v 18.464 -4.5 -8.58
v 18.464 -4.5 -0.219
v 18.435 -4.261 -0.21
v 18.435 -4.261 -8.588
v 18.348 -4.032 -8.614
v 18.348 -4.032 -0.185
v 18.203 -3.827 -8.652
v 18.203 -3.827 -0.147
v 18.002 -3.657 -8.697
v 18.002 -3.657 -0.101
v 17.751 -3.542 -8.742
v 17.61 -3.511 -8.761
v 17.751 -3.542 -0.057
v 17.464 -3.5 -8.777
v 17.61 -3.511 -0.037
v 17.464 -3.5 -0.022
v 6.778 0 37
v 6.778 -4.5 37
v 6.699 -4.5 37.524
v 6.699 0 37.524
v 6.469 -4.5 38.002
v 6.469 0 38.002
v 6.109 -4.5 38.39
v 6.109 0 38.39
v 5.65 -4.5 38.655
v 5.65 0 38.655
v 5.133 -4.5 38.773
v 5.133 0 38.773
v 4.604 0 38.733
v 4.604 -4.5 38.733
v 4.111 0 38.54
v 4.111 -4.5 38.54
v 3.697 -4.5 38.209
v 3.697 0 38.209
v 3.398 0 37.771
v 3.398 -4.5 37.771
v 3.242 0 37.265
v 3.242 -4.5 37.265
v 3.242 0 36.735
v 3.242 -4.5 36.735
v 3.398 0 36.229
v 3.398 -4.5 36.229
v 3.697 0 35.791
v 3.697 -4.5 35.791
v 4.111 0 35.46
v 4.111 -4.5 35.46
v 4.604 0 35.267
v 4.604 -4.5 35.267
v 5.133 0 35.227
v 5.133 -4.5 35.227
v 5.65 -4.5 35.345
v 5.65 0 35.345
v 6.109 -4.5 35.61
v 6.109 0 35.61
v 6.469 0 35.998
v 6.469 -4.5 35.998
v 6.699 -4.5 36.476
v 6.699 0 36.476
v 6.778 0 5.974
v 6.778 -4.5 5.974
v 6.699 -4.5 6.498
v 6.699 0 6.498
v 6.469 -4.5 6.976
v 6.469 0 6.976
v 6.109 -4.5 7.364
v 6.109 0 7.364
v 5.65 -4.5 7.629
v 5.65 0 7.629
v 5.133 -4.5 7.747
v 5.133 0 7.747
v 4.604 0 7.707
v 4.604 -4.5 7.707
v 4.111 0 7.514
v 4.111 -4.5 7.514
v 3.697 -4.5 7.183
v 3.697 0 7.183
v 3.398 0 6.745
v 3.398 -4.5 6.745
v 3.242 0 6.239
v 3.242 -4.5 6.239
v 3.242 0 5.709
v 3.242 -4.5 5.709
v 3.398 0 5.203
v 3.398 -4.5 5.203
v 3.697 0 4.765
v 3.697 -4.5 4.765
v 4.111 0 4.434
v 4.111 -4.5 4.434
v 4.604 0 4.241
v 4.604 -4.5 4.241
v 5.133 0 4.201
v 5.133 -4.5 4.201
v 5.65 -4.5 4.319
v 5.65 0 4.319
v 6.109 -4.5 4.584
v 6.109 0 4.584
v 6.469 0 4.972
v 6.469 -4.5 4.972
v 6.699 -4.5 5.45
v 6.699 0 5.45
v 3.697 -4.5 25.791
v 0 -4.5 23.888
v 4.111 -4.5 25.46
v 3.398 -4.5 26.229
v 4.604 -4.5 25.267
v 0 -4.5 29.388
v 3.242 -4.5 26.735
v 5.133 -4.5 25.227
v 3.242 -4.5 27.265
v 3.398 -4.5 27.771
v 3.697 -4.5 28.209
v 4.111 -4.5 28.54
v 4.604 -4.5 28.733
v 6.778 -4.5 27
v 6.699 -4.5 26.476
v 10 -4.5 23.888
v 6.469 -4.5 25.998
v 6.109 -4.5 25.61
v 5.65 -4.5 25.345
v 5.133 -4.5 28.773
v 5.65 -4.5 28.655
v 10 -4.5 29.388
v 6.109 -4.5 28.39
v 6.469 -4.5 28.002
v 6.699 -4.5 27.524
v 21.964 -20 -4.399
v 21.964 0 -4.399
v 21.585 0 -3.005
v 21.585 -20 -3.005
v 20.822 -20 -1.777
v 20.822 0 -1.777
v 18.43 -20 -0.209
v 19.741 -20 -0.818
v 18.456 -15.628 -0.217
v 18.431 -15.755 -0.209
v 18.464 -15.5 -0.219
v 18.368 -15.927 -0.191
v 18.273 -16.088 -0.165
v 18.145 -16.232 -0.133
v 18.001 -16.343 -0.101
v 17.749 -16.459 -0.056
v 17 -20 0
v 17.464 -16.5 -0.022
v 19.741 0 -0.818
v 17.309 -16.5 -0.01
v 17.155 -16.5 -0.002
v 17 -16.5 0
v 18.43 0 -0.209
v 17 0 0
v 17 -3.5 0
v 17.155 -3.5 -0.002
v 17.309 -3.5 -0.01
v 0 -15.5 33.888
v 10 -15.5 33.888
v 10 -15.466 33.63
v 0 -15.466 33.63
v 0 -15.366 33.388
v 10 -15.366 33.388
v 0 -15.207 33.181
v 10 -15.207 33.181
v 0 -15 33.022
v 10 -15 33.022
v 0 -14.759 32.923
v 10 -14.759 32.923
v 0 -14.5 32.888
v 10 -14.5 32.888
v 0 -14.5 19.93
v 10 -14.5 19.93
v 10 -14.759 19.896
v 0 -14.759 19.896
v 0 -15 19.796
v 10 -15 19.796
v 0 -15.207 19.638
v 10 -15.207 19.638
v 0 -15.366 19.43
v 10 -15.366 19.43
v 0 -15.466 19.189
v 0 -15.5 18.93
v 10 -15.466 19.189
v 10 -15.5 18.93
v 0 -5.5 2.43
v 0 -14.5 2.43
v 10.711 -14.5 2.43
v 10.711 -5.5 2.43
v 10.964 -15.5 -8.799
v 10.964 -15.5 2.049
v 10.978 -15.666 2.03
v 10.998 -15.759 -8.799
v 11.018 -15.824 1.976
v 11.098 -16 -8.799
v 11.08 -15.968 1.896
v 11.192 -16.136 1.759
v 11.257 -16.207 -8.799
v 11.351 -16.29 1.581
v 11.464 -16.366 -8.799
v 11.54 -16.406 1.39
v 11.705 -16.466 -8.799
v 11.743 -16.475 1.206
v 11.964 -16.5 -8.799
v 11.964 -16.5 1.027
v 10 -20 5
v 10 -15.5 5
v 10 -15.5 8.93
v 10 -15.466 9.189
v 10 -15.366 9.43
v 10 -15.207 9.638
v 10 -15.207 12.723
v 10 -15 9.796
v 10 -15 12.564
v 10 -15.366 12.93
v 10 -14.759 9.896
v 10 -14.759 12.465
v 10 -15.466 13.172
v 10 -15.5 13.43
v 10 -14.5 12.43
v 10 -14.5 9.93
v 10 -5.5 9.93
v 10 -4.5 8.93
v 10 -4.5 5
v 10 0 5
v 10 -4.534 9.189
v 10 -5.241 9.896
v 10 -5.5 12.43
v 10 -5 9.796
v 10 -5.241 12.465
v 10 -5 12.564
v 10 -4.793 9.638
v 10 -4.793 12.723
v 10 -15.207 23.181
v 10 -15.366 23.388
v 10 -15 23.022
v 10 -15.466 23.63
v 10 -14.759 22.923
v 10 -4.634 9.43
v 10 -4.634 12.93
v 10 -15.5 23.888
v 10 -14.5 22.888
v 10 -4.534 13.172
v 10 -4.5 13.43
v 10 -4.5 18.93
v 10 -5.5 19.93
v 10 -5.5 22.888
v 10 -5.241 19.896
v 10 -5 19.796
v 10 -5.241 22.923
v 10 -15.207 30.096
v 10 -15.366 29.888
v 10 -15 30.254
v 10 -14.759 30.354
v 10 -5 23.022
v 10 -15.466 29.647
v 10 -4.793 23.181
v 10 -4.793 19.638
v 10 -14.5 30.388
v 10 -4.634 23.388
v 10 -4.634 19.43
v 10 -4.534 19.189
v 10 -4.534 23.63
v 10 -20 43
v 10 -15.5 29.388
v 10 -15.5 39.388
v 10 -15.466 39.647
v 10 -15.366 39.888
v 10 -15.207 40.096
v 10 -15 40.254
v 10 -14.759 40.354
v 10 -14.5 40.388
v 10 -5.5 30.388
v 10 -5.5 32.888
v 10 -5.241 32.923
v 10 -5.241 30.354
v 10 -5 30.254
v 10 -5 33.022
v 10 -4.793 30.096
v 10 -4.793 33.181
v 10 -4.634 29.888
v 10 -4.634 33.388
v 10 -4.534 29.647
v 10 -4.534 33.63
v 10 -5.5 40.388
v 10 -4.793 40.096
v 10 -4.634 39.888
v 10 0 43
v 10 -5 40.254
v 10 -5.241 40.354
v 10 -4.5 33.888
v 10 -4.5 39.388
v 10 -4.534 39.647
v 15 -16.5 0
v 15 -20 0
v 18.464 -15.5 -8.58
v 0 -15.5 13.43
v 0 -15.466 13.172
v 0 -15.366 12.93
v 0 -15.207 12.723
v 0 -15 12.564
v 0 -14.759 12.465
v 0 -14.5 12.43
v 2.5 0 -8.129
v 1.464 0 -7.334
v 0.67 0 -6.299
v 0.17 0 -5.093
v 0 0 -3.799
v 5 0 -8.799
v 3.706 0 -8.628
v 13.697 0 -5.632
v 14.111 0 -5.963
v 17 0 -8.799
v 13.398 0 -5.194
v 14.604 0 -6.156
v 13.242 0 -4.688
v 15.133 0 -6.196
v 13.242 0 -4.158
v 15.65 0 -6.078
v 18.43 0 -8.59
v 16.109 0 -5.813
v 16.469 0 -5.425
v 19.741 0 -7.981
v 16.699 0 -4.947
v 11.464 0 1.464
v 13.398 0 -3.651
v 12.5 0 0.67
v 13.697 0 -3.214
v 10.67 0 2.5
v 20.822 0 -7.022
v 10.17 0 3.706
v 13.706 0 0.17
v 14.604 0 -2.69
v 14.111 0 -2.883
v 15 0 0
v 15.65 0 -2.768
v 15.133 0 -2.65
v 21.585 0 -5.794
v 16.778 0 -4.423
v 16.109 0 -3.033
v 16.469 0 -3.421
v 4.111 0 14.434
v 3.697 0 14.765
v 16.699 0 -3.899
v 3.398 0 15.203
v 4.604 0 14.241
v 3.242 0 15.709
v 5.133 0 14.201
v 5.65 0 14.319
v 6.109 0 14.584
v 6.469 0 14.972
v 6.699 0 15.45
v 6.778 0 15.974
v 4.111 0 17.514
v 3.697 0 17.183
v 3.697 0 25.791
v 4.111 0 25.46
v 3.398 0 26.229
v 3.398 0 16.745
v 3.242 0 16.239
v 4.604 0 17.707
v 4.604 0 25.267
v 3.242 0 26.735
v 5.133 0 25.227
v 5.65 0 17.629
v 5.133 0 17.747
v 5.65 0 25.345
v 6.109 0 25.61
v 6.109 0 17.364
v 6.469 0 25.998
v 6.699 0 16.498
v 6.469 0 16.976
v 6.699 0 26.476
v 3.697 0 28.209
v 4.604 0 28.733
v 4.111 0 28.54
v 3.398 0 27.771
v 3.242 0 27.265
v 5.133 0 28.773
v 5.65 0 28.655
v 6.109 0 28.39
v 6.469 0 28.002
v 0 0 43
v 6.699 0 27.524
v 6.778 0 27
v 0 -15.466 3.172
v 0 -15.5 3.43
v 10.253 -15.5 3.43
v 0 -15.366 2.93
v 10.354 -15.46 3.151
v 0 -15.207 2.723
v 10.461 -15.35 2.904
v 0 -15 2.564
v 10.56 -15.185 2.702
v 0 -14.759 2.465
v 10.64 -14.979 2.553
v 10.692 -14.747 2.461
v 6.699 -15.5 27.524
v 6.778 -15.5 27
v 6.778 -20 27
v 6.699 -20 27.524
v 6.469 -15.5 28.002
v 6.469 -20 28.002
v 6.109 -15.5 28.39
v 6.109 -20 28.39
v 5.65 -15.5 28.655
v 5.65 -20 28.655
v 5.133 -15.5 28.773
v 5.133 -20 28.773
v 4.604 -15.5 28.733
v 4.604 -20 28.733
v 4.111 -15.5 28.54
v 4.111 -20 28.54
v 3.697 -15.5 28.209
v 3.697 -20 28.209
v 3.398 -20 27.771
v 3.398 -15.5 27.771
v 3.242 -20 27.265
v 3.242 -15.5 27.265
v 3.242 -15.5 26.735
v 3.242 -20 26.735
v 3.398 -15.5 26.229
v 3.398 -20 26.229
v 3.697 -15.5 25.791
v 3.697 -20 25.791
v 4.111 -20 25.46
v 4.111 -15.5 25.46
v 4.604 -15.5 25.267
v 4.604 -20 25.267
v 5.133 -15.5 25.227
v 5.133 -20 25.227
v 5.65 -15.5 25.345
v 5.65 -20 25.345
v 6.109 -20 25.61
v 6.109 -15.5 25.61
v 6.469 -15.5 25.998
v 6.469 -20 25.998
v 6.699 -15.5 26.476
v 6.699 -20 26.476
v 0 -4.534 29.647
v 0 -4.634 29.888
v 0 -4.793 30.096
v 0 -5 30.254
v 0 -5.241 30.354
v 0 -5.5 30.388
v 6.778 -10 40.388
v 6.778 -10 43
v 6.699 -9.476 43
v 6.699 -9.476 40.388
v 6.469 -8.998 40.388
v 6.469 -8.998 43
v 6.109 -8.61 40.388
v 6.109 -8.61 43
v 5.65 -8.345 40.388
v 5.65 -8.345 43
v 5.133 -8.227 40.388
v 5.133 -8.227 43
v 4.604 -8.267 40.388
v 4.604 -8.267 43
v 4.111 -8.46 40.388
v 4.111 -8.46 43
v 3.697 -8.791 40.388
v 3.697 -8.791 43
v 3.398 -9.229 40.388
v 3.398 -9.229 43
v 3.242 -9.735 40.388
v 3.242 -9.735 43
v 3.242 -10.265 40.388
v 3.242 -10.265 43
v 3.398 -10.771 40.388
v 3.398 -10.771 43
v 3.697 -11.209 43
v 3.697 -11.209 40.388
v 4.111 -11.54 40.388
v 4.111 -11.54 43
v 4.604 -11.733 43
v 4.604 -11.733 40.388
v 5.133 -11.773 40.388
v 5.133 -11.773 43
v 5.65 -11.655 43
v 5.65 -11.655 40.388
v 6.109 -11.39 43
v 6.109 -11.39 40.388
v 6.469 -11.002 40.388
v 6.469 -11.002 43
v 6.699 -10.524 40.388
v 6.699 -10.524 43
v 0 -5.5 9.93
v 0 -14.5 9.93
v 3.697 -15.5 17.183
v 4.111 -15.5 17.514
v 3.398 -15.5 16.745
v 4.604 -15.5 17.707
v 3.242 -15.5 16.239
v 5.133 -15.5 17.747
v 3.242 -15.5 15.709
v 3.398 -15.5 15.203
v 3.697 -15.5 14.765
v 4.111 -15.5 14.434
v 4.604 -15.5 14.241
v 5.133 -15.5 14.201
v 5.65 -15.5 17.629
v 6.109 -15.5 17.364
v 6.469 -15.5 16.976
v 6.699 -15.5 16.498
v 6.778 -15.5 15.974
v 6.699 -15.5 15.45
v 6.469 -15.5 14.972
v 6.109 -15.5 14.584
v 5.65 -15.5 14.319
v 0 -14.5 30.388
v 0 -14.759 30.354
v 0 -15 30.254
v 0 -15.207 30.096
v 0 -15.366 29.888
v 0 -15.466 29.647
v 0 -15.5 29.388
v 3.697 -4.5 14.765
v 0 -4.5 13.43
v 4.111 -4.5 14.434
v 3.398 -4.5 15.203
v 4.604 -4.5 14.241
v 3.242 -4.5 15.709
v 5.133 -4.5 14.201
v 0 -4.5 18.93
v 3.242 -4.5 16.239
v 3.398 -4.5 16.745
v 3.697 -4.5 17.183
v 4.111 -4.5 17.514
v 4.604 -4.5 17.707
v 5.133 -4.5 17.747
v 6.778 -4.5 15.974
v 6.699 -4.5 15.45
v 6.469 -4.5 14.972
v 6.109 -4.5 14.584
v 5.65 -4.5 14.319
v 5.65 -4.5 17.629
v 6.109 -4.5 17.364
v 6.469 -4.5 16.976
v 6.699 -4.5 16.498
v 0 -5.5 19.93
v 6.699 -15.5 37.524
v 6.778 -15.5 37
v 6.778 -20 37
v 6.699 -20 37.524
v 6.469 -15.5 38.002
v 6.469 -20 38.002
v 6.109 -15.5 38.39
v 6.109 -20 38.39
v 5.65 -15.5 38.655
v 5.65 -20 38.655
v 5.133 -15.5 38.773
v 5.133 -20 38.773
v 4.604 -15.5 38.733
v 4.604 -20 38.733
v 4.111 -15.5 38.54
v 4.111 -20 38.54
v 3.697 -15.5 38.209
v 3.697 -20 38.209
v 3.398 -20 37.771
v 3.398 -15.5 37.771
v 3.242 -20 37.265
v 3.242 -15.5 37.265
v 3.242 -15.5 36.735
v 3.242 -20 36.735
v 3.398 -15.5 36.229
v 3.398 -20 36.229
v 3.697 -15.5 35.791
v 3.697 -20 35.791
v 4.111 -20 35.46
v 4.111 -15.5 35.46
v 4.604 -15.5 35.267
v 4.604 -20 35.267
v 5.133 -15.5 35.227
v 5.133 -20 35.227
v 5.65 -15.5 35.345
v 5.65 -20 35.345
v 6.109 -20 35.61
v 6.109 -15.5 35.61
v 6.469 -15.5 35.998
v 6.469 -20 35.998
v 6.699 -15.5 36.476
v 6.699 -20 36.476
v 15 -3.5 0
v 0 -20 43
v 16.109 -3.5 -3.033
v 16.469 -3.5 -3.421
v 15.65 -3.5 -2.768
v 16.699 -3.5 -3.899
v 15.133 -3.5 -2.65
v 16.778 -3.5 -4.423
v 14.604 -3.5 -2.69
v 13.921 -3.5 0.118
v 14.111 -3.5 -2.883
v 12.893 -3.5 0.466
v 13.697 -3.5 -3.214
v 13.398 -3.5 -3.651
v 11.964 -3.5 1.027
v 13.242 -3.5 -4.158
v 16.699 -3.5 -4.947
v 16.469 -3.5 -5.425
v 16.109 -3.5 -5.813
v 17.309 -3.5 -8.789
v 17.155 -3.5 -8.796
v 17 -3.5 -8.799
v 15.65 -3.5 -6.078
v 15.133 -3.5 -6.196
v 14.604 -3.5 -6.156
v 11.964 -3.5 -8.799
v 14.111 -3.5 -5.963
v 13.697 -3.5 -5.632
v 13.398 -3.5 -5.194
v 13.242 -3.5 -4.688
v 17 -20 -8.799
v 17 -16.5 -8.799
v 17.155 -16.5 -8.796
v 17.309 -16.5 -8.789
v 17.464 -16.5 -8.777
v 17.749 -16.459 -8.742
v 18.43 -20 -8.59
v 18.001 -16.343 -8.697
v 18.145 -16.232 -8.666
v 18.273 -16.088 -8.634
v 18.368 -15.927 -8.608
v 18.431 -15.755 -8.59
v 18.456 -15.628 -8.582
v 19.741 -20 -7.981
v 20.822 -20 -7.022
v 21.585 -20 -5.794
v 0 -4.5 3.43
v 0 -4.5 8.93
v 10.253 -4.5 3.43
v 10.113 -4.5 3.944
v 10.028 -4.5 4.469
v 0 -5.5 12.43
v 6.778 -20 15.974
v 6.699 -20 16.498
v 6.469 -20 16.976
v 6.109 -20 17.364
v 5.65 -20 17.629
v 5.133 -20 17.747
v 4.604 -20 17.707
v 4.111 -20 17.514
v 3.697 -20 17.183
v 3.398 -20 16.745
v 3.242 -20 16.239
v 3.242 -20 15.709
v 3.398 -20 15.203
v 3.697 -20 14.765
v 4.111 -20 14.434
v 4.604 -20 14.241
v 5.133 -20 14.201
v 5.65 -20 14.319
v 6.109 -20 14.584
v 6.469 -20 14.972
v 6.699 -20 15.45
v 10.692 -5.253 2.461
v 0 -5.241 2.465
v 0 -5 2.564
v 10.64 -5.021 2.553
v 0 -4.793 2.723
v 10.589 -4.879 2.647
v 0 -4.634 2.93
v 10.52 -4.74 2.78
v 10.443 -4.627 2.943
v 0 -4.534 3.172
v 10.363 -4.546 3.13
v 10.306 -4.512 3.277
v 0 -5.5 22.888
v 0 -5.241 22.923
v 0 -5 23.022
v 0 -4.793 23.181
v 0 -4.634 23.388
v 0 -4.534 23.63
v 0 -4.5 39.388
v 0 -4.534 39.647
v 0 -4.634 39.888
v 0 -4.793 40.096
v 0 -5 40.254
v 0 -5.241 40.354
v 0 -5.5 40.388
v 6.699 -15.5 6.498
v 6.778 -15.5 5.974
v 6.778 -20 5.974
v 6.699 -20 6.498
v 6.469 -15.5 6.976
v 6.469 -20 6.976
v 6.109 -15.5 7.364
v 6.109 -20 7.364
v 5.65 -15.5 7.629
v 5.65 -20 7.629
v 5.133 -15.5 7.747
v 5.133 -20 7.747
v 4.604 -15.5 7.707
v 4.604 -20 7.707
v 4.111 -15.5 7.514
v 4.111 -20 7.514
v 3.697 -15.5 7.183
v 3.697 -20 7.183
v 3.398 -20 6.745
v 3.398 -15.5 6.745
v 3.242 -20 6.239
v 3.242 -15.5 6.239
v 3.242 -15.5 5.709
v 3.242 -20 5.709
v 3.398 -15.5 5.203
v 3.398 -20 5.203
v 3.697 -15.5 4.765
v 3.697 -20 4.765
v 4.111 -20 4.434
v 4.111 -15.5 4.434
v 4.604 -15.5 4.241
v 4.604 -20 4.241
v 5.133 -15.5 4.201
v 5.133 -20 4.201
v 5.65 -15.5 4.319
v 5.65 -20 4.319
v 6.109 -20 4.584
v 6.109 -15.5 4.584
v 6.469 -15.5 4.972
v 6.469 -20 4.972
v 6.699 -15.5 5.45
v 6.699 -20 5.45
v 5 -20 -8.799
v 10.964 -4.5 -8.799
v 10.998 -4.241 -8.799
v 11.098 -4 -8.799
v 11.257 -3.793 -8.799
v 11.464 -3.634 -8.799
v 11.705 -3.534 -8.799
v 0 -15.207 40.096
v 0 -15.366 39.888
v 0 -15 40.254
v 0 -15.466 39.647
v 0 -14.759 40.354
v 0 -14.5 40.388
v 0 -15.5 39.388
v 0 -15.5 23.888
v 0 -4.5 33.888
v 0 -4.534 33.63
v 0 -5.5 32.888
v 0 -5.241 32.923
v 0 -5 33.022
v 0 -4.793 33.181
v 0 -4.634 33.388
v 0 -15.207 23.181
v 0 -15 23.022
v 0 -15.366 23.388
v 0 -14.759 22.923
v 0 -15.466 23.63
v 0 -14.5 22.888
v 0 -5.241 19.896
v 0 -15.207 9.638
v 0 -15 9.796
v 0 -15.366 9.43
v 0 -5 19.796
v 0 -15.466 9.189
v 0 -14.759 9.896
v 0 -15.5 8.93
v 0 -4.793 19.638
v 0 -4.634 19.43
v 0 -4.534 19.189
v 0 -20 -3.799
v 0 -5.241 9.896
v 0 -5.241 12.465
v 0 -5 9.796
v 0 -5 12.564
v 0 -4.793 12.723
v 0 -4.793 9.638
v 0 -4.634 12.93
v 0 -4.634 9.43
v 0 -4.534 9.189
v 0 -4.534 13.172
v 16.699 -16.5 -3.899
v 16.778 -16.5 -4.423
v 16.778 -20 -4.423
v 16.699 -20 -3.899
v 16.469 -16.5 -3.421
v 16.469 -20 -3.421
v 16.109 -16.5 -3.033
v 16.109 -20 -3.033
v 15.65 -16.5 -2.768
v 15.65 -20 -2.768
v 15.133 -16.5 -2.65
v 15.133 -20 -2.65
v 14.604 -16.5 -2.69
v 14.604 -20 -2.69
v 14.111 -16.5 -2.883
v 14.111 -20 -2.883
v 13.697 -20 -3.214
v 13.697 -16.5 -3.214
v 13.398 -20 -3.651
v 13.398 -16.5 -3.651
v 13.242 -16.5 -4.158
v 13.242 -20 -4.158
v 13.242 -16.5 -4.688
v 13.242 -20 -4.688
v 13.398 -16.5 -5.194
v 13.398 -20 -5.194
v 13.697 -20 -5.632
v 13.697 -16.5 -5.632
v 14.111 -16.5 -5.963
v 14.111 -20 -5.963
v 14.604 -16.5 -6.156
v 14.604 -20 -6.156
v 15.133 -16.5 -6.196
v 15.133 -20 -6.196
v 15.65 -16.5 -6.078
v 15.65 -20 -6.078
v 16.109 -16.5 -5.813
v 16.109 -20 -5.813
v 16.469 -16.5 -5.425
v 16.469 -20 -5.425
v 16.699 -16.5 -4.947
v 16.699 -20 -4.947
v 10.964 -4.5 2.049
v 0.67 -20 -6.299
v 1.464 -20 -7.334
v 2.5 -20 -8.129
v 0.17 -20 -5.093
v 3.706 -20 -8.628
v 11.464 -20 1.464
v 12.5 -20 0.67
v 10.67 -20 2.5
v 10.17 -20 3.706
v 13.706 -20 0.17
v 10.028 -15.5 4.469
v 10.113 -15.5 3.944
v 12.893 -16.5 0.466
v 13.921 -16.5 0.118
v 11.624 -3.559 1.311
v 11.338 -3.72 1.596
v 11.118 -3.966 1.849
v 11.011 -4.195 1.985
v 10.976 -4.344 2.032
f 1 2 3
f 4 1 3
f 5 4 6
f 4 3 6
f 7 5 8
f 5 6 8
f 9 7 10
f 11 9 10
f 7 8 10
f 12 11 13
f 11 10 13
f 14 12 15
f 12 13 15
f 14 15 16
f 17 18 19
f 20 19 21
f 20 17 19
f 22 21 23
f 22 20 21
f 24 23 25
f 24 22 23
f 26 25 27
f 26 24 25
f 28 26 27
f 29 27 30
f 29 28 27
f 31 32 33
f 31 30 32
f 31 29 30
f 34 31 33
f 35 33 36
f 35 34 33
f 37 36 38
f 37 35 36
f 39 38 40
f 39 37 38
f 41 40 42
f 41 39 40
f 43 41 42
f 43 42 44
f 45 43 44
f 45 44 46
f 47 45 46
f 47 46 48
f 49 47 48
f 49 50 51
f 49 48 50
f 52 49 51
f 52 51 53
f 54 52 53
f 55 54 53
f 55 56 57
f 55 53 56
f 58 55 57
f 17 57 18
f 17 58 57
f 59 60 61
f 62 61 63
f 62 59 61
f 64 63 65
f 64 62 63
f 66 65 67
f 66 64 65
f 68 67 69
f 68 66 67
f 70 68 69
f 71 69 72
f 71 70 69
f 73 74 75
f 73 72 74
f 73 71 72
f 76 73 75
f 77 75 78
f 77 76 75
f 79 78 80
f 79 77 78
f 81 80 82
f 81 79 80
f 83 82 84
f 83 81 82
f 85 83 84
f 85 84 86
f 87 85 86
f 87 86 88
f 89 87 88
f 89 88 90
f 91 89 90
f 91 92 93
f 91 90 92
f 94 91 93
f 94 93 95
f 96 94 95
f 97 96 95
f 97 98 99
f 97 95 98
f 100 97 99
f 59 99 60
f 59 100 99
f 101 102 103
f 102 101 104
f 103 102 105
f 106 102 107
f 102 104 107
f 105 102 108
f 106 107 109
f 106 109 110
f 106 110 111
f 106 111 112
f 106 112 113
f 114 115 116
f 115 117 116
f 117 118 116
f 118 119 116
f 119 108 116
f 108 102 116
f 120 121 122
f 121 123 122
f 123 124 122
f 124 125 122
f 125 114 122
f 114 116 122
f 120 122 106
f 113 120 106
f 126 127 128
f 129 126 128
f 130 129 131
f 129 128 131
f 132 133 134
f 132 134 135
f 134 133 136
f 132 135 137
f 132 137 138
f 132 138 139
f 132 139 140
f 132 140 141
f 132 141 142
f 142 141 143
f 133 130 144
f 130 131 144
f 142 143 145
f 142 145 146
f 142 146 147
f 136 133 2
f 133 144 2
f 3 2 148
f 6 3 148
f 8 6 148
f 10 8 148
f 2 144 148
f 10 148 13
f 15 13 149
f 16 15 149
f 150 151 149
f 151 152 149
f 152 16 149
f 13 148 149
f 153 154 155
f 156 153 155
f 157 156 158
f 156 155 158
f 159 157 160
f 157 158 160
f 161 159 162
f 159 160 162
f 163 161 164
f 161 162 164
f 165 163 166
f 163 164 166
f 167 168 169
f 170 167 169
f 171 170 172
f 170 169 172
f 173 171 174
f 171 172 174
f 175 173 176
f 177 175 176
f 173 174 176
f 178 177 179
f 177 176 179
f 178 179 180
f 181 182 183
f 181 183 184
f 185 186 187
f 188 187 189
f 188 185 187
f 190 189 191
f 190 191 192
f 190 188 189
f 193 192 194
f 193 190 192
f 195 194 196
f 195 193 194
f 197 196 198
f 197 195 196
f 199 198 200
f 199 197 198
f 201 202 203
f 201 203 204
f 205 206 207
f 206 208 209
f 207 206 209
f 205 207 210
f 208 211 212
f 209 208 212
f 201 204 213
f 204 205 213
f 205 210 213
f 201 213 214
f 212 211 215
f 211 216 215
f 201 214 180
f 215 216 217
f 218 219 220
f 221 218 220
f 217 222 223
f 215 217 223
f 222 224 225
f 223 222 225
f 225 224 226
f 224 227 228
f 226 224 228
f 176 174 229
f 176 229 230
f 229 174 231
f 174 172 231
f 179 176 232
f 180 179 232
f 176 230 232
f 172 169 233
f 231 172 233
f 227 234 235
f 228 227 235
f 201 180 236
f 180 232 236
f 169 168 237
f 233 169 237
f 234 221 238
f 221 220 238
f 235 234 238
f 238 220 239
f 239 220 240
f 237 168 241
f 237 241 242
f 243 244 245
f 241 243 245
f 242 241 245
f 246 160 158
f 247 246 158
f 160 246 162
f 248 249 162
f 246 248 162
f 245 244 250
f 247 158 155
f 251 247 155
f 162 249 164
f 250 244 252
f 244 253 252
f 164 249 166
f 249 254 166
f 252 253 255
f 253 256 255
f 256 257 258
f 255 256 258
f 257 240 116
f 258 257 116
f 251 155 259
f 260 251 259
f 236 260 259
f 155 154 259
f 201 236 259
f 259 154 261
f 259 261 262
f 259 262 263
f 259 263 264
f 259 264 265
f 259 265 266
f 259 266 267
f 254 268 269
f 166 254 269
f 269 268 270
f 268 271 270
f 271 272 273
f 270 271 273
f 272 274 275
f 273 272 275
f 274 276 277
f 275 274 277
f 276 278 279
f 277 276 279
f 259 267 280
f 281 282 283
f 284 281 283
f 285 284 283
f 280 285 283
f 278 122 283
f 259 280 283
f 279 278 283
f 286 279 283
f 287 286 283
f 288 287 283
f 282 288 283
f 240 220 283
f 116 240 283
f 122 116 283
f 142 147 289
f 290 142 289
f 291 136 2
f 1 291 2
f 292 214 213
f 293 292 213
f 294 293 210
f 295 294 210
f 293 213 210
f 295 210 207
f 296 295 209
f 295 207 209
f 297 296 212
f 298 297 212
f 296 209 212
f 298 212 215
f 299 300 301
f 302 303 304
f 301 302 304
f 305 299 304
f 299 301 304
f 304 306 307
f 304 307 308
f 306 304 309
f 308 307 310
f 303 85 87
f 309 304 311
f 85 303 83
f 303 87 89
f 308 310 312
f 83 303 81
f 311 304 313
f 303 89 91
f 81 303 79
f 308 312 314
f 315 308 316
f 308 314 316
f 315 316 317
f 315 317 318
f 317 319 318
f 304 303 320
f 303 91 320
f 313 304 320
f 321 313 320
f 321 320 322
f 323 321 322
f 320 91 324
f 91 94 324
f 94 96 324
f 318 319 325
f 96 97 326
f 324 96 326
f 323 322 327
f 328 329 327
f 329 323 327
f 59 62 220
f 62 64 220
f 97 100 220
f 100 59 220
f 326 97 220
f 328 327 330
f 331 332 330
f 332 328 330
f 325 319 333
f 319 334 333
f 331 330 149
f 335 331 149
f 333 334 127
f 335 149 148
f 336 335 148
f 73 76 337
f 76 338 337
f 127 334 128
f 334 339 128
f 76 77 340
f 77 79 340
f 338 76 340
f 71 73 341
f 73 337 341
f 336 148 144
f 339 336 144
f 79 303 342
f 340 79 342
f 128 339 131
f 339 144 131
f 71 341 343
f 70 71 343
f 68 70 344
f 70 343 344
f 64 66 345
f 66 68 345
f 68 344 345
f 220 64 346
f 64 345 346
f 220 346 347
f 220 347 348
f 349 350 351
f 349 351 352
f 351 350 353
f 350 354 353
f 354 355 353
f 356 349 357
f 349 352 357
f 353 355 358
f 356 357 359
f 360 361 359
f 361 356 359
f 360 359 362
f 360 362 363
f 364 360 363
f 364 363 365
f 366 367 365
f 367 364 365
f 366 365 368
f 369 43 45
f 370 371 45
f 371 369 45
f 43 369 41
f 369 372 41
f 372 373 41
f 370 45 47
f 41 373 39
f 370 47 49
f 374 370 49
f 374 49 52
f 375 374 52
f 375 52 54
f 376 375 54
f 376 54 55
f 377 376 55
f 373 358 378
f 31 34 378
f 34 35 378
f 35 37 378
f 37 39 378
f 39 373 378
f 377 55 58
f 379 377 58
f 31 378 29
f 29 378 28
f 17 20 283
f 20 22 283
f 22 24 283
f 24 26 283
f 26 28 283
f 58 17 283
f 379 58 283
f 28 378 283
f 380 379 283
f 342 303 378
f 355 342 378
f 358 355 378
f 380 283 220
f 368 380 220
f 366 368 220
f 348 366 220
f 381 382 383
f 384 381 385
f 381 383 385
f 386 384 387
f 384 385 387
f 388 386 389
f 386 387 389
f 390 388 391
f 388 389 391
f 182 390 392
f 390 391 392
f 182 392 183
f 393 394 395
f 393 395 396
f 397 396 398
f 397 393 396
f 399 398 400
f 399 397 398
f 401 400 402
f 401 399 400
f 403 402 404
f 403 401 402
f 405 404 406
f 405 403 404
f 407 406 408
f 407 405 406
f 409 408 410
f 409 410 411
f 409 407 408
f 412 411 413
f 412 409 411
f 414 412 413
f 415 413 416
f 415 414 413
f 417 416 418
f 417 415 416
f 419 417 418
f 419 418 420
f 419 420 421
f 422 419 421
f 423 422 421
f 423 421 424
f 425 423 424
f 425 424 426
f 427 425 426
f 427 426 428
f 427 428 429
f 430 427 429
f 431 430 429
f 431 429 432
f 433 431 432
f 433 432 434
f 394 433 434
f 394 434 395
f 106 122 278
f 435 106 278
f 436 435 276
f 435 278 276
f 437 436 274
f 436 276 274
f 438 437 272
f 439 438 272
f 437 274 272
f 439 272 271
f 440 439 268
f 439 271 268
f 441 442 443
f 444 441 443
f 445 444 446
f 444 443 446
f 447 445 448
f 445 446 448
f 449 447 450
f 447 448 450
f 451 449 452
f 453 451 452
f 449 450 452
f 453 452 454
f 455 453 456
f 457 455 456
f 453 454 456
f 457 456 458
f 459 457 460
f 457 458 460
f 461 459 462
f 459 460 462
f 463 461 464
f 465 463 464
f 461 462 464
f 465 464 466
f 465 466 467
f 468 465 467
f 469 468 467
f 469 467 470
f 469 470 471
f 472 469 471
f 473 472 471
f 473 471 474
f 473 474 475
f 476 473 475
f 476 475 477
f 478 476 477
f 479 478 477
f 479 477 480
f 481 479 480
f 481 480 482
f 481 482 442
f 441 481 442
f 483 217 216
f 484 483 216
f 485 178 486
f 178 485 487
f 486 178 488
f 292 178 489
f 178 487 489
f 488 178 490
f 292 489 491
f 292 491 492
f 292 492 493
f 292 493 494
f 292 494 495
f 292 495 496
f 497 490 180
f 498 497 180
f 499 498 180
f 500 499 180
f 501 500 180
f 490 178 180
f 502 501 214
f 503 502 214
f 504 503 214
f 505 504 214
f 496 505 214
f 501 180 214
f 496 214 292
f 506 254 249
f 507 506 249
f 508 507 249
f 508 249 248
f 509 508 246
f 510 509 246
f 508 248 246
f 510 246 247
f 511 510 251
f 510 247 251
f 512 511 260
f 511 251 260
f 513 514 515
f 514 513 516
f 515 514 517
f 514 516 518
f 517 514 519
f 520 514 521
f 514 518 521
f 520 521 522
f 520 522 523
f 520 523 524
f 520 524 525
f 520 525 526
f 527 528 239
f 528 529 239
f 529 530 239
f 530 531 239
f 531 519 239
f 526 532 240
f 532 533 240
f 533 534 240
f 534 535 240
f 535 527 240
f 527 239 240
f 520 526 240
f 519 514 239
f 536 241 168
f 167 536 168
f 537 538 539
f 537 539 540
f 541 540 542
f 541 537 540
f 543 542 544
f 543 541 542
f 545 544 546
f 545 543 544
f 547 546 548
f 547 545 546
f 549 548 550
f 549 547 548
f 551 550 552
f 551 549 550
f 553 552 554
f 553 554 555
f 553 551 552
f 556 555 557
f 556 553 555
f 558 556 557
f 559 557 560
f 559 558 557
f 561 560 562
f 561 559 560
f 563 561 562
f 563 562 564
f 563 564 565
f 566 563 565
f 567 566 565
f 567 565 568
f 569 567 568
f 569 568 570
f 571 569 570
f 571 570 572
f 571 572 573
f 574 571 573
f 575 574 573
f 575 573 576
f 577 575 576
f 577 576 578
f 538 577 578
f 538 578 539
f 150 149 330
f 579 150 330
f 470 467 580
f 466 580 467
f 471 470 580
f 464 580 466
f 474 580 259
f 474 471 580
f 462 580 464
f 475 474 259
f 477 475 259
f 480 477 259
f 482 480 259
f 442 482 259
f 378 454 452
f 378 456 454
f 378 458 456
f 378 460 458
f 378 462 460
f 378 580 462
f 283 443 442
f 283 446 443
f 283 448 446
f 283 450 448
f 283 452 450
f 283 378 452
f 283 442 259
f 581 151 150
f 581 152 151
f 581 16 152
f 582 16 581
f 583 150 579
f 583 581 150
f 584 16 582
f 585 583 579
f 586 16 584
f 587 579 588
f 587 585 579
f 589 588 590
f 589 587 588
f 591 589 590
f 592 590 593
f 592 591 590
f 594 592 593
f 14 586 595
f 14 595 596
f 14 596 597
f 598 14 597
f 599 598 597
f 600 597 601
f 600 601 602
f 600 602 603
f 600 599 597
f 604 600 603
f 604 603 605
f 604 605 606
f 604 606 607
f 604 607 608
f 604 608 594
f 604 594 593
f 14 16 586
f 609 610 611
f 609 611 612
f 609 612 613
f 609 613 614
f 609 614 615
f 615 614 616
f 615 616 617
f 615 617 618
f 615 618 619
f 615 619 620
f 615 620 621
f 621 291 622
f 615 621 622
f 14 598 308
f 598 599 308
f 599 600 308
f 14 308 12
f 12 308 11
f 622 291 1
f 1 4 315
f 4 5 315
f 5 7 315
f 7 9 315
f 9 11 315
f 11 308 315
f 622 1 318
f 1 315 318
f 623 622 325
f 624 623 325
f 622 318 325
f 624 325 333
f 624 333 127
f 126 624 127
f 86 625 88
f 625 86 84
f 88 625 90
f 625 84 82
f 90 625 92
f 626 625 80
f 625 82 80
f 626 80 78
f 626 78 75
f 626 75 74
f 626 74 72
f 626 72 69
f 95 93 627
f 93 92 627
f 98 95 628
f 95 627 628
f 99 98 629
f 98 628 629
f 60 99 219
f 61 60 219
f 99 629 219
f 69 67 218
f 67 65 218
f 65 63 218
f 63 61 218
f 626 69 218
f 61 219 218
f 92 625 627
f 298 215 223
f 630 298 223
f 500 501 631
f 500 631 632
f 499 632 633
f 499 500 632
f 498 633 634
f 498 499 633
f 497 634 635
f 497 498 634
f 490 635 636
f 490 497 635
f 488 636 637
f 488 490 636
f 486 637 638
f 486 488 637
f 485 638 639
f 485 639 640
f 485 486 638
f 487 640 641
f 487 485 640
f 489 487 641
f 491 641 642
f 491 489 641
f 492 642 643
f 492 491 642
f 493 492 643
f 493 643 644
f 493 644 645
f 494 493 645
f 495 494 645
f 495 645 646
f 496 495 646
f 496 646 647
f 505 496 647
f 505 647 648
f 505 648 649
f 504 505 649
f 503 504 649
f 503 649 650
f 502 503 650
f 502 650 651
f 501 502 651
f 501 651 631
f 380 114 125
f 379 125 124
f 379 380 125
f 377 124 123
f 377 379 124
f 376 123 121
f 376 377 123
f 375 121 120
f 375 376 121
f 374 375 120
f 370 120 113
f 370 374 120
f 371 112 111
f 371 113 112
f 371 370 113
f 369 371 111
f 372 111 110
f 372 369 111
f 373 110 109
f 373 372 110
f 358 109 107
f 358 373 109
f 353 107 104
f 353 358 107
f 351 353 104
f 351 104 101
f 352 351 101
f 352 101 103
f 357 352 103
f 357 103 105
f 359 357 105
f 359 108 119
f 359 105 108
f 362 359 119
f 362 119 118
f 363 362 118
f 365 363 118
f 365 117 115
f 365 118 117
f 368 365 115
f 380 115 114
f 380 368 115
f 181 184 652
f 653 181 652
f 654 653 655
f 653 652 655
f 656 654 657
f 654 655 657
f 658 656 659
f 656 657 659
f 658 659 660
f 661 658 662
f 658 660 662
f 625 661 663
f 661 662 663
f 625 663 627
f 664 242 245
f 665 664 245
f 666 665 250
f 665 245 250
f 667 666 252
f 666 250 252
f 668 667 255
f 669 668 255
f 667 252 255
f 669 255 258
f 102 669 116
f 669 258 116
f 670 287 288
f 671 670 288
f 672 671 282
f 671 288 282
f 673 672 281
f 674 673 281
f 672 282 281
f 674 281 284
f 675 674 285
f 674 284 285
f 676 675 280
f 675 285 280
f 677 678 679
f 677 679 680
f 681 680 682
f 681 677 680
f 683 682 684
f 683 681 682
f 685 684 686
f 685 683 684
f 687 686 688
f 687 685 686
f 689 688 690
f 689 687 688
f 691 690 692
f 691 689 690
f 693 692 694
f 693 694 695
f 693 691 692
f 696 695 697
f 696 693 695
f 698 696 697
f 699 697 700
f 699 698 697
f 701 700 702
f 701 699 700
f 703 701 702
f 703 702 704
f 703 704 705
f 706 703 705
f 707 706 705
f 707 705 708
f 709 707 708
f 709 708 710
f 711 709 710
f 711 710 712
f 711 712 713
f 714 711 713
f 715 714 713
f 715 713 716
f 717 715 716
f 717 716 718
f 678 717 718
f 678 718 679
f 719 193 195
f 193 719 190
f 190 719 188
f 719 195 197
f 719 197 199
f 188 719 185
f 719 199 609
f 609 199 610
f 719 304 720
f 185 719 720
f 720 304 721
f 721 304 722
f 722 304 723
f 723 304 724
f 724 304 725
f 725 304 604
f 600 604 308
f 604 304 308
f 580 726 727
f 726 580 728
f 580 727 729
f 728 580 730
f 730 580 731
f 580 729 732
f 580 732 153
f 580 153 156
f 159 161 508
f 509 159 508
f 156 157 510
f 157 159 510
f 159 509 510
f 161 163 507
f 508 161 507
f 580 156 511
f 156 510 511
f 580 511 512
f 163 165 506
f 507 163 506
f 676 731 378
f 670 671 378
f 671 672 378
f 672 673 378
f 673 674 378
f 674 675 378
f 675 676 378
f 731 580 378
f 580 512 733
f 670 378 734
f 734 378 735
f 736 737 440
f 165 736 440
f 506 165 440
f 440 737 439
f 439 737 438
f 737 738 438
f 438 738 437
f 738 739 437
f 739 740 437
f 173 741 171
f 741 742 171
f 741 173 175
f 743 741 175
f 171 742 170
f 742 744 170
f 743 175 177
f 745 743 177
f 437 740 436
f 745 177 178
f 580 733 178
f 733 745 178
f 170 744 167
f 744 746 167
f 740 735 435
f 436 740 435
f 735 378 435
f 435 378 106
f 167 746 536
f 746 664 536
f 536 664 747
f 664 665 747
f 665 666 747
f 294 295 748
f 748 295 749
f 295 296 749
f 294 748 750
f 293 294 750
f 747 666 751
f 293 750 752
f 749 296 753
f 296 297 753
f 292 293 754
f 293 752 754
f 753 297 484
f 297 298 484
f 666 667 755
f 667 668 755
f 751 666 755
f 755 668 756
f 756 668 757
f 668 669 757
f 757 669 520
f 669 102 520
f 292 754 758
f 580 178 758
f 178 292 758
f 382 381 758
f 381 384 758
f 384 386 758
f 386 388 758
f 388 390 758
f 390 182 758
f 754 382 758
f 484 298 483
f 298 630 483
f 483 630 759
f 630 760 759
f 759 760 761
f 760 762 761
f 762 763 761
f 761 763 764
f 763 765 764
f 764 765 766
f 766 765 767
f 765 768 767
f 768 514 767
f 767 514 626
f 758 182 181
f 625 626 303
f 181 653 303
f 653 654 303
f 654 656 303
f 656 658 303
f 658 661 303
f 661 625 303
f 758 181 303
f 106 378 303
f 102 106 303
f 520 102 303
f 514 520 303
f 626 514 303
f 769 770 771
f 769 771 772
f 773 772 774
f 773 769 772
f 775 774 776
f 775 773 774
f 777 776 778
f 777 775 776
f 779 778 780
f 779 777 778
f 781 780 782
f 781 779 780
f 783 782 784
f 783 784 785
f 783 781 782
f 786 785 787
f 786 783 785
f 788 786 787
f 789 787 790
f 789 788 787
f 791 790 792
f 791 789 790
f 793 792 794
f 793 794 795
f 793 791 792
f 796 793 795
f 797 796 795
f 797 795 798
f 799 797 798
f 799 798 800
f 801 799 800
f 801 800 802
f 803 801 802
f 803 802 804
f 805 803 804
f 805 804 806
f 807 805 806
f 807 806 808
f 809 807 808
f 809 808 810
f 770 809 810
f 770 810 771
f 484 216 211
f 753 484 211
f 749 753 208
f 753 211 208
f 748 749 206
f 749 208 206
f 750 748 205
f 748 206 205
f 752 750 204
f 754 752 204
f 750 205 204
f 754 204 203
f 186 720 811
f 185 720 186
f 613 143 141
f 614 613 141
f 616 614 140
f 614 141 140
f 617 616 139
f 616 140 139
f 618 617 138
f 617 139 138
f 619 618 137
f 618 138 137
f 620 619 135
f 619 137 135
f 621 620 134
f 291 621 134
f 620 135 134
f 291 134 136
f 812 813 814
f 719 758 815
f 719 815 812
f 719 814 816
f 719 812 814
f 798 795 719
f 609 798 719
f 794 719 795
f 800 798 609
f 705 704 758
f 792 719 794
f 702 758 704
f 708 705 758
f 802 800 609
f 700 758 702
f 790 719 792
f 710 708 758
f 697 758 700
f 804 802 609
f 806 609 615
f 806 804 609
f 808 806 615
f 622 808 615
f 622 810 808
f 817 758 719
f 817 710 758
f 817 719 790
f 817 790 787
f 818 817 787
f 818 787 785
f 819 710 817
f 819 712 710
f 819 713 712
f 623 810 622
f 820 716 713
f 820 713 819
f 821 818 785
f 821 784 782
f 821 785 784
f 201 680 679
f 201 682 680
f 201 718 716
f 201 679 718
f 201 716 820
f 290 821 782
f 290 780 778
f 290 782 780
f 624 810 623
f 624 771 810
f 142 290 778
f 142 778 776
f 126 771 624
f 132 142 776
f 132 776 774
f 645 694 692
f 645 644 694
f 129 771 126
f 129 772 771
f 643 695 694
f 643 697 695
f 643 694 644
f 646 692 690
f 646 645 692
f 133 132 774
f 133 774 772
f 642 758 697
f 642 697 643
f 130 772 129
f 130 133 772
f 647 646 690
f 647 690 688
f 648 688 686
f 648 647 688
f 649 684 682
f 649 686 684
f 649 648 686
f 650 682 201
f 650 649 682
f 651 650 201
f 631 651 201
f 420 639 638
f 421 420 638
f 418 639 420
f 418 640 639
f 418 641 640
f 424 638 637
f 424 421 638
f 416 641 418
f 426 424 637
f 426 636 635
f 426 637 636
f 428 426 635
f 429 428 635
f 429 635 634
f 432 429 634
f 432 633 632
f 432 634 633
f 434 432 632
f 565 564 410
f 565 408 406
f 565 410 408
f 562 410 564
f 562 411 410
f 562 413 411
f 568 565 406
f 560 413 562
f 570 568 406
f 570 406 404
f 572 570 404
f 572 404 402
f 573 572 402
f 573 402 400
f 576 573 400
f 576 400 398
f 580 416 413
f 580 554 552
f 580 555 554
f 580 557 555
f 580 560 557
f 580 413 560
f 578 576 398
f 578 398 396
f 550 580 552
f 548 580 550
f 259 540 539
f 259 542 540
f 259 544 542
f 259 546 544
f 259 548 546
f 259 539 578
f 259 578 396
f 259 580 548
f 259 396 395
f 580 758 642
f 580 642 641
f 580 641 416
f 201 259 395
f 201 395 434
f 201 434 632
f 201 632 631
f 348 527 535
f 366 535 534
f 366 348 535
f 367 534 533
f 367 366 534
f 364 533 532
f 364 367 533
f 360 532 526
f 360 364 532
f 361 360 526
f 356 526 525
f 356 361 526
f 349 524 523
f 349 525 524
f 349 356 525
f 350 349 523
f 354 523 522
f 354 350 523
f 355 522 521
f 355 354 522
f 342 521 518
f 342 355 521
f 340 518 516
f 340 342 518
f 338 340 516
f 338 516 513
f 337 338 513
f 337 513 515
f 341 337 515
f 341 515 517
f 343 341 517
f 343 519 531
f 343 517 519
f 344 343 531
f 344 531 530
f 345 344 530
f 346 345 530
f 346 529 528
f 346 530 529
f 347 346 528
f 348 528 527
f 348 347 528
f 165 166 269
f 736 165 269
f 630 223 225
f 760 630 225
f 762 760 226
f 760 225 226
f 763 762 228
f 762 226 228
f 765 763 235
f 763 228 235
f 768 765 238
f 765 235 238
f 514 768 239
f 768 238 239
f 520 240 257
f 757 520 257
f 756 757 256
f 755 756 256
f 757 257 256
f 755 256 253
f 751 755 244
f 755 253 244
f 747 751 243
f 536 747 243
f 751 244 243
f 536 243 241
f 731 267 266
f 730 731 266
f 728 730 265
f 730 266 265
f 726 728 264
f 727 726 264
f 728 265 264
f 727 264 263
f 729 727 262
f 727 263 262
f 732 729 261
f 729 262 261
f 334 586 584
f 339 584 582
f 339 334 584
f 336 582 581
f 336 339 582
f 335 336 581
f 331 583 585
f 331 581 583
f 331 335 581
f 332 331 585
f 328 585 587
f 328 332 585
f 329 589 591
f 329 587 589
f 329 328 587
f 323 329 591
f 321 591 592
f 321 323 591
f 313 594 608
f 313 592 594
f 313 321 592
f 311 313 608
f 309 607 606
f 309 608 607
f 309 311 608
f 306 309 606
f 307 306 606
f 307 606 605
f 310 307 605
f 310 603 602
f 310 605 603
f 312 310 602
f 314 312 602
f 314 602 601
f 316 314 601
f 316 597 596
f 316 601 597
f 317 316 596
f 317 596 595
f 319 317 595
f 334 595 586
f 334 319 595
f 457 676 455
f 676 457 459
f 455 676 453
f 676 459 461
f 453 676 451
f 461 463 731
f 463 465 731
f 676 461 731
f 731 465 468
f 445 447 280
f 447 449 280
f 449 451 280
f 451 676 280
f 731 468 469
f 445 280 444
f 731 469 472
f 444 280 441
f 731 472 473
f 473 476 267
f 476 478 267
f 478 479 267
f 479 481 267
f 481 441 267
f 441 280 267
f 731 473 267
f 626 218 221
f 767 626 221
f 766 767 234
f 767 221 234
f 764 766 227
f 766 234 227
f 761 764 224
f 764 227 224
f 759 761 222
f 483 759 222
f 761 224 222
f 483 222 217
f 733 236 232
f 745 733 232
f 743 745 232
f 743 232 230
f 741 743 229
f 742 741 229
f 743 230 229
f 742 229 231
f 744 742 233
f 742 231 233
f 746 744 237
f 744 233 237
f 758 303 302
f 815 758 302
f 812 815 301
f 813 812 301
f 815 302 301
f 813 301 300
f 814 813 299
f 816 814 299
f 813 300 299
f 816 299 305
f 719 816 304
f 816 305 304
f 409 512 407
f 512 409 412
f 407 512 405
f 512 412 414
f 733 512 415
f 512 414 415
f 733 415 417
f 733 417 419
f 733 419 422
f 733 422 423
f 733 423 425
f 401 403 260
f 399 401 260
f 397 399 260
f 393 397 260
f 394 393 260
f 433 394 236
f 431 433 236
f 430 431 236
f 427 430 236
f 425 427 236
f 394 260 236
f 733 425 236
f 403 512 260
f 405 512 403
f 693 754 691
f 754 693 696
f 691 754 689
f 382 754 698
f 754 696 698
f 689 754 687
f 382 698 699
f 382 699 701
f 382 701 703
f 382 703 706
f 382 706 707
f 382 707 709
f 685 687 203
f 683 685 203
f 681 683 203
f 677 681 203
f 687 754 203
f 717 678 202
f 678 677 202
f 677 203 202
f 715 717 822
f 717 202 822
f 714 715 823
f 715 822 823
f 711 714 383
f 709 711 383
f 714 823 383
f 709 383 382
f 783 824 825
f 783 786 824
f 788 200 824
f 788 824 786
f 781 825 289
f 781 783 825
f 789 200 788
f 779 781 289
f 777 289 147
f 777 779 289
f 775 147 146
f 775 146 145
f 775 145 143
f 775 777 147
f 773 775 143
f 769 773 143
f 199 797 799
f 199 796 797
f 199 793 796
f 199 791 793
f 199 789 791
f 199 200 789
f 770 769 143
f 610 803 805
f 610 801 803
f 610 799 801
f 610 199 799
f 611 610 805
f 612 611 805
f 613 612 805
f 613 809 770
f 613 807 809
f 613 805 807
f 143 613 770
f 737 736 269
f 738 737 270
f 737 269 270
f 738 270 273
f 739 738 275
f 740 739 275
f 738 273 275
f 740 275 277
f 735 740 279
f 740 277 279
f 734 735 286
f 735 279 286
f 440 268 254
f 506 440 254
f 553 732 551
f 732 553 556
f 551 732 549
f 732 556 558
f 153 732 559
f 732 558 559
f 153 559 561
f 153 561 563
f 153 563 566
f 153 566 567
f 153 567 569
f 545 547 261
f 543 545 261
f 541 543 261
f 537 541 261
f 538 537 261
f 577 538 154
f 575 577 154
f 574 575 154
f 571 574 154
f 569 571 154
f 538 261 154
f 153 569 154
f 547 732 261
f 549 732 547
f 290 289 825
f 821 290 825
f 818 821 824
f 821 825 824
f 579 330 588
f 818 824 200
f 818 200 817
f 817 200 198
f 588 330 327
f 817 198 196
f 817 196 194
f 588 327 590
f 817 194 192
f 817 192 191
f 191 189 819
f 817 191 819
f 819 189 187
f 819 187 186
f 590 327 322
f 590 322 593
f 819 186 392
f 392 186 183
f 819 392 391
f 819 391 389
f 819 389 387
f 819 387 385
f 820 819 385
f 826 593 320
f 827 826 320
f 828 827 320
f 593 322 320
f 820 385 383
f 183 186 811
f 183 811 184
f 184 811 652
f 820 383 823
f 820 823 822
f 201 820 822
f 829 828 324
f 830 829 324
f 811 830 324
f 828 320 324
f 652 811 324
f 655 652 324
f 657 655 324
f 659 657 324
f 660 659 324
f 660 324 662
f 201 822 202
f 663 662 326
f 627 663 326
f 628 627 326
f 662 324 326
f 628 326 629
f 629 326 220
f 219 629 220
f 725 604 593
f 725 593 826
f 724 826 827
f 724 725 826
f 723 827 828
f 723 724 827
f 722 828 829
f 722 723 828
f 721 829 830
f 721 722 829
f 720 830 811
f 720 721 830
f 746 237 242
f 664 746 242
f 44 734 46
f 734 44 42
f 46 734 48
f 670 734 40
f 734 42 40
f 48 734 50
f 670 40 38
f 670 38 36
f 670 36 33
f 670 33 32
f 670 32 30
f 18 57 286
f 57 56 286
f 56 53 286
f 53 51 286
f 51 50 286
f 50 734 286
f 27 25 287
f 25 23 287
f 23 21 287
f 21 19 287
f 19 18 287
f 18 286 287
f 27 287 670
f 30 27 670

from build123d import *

# Parameters (mm, degrees)
F1_DEPTH      = 20
F0_R          = 1.778
F3_DEPTH      = 25
F3_DEPTH_BACK = 25
F5_DEPTH      = 25
F5_DEPTH_BACK = 25
F6_R          = 1.778
F7_DEPTH      = 2.611541214
F8_R          = 1.778
F9_DEPTH      = 5


with BuildPart() as f1:
    # F0 (on Front) → F1 (new body)
    with BuildSketch(Plane.XZ):
        with BuildLine():
            ThreePointArc((22, -3.7987752631), (21.9909406431, -4.0996265512), (21.963795401, -4.3993876316))
            ThreePointArc((21.963795401, -4.3993876316), (21.9909406431, -4.6991487119), (22, -5))
            Line((22, -5), (22, -3.7987752631))
        make_face()
    extrude(amount=F1_DEPTH)


with BuildPart() as f1b:
    # F0 (on Front) → F1, piece 2 (new body)
    with BuildSketch(Plane.XZ):
        with BuildLine():
            Line((10, 43), (0, 43))
            Line((0, 43), (0, 0))
            Line((0, 0), (0, -3.7987752631))
            ThreePointArc((0, -3.7987752631), (1.4644660941, -7.3343091691), (5, -8.7987752631))
            Line((5, -8.7987752631), (17, -8.7987752631))
            ThreePointArc((17, -8.7987752631), (20.3163939873, -7.5406372222), (21.963795401, -4.3993876316))
            ThreePointArc((21.963795401, -4.3993876316), (20.3163939873, -1.2581380409), (17, 0))
            Line((17, 0), (15, 0))
            ThreePointArc((15, 0), (11.4644660941, 1.4644660941), (10, 5))
            Line((10, 5), (10, 43))
        make_face()
        with Locations((5, 5.9739946499)):
            Circle(F0_R, mode=Mode.SUBTRACT)
        with Locations((5, 15.9739946499)):
            Circle(F0_R, mode=Mode.SUBTRACT)
        with Locations((15, -4.4229245409)):
            Circle(F0_R, mode=Mode.SUBTRACT)
        with Locations((5, 26.9999946499)):
            Circle(F0_R, mode=Mode.SUBTRACT)
        with Locations((5, 36.9999946499)):
            Circle(F0_R, mode=Mode.SUBTRACT)
    extrude(amount=F1_DEPTH)

    # F2 (on face) → F3 (cut, two sides)
    with BuildSketch(Plane.YZ.offset(10)) as f3_sk:
        with BuildLine():
            ThreePointArc((-15.5, 3.430458786), (-15.2071067812, 2.7233520048), (-14.5, 2.430458786))
            Line((-14.5, 2.430458786), (-5.5, 2.430458786))
            ThreePointArc((-5.5, 2.430458786), (-4.7928932188, 2.7233520048), (-4.5, 3.430458786))
            Line((-4.5, 3.430458786), (-4.5, 8.930458786))
            ThreePointArc((-4.5, 8.930458786), (-4.7928932188, 9.6375655672), (-5.5, 9.930458786))
            Line((-5.5, 9.930458786), (-14.5, 9.930458786))
            ThreePointArc((-14.5, 9.930458786), (-15.2071067812, 9.6375655672), (-15.5, 8.930458786))
            Line((-15.5, 8.930458786), (-15.5, 3.430458786))
        make_face()
        with BuildLine():
            Line((-5.5, 19.930458786), (-14.5, 19.930458786))
            ThreePointArc((-14.5, 19.930458786), (-15.2071067812, 19.6375655672), (-15.5, 18.930458786))
            Line((-15.5, 18.930458786), (-15.5, 13.430458786))
            ThreePointArc((-15.5, 13.430458786), (-15.2071067812, 12.7233520048), (-14.5, 12.430458786))
            Line((-14.5, 12.430458786), (-5.5, 12.430458786))
            ThreePointArc((-5.5, 12.430458786), (-4.7928932188, 12.7233520048), (-4.5, 13.430458786))
            Line((-4.5, 13.430458786), (-4.5, 18.930458786))
            ThreePointArc((-4.5, 18.930458786), (-4.7928932188, 19.6375655672), (-5.5, 19.930458786))
        make_face()
        with BuildLine():
            ThreePointArc((-14.5, 40.388458786), (-15.2071067812, 40.0955655672), (-15.5, 39.388458786))
            Line((-15.5, 39.388458786), (-15.5, 33.888458786))
            ThreePointArc((-15.5, 33.888458786), (-15.2071067812, 33.1813520048), (-14.5, 32.888458786))
            Line((-14.5, 32.888458786), (-5.5, 32.888458786))
            ThreePointArc((-5.5, 32.888458786), (-4.7928932188, 33.1813520048), (-4.5, 33.888458786))
            Line((-4.5, 33.888458786), (-4.5, 39.388458786))
            ThreePointArc((-4.5, 39.388458786), (-4.7928932188, 40.0955655672), (-5.5, 40.388458786))
            Line((-5.5, 40.388458786), (-14.5, 40.388458786))
        make_face()
        with BuildLine():
            ThreePointArc((-14.5, 30.388458786), (-15.2071067812, 30.0955655672), (-15.5, 29.388458786))
            Line((-15.5, 29.388458786), (-15.5, 23.888458786))
            ThreePointArc((-15.5, 23.888458786), (-15.2071067812, 23.1813520048), (-14.5, 22.888458786))
            Line((-14.5, 22.888458786), (-5.5, 22.888458786))
            ThreePointArc((-5.5, 22.888458786), (-4.7928932188, 23.1813520048), (-4.5, 23.888458786))
            Line((-4.5, 23.888458786), (-4.5, 29.388458786))
            ThreePointArc((-4.5, 29.388458786), (-4.7928932188, 30.0955655672), (-5.5, 30.388458786))
            Line((-5.5, 30.388458786), (-14.5, 30.388458786))
        make_face()
    extrude(amount=-F3_DEPTH, mode=Mode.SUBTRACT)
    extrude(f3_sk.sketch, amount=F3_DEPTH_BACK, mode=Mode.SUBTRACT)

    # F4 (on face) → F5 (cut, two sides)
    with BuildSketch(Plane.XY) as f5_sk:
        with BuildLine():
            Line((11.963795401, -16.5), (17.463795401, -16.5))
            ThreePointArc((17.463795401, -16.5), (18.1709021822, -16.2071067812), (18.463795401, -15.5))
            Line((18.463795401, -15.5), (18.463795401, -4.5))
            ThreePointArc((18.463795401, -4.5), (18.1709021822, -3.7928932188), (17.463795401, -3.5))
            Line((17.463795401, -3.5), (11.963795401, -3.5))
            ThreePointArc((11.963795401, -3.5), (11.2566886198, -3.7928932188), (10.963795401, -4.5))
            Line((10.963795401, -4.5), (10.963795401, -15.5))
            ThreePointArc((10.963795401, -15.5), (11.2566886198, -16.2071067812), (11.963795401, -16.5))
        make_face()
    extrude(amount=-F5_DEPTH, mode=Mode.SUBTRACT)
    extrude(f5_sk.sketch, amount=F5_DEPTH_BACK, mode=Mode.SUBTRACT)

    # F6 (on face) → F7 (join, through all)
    with BuildSketch(Plane.XY.offset(43)):
        with Locations((5, -13.5)):
            Circle(F6_R)
        with Locations((5, -6.5)):
            Circle(F6_R)
    extrude(amount=-F7_DEPTH)

    # F8 (on face) → F9 (cut)
    with BuildSketch(Plane.XY.offset(43)):
        with Locations((5, -10)):
            Circle(F8_R)
    extrude(amount=-F9_DEPTH, mode=Mode.SUBTRACT)


solid = f1b.part
